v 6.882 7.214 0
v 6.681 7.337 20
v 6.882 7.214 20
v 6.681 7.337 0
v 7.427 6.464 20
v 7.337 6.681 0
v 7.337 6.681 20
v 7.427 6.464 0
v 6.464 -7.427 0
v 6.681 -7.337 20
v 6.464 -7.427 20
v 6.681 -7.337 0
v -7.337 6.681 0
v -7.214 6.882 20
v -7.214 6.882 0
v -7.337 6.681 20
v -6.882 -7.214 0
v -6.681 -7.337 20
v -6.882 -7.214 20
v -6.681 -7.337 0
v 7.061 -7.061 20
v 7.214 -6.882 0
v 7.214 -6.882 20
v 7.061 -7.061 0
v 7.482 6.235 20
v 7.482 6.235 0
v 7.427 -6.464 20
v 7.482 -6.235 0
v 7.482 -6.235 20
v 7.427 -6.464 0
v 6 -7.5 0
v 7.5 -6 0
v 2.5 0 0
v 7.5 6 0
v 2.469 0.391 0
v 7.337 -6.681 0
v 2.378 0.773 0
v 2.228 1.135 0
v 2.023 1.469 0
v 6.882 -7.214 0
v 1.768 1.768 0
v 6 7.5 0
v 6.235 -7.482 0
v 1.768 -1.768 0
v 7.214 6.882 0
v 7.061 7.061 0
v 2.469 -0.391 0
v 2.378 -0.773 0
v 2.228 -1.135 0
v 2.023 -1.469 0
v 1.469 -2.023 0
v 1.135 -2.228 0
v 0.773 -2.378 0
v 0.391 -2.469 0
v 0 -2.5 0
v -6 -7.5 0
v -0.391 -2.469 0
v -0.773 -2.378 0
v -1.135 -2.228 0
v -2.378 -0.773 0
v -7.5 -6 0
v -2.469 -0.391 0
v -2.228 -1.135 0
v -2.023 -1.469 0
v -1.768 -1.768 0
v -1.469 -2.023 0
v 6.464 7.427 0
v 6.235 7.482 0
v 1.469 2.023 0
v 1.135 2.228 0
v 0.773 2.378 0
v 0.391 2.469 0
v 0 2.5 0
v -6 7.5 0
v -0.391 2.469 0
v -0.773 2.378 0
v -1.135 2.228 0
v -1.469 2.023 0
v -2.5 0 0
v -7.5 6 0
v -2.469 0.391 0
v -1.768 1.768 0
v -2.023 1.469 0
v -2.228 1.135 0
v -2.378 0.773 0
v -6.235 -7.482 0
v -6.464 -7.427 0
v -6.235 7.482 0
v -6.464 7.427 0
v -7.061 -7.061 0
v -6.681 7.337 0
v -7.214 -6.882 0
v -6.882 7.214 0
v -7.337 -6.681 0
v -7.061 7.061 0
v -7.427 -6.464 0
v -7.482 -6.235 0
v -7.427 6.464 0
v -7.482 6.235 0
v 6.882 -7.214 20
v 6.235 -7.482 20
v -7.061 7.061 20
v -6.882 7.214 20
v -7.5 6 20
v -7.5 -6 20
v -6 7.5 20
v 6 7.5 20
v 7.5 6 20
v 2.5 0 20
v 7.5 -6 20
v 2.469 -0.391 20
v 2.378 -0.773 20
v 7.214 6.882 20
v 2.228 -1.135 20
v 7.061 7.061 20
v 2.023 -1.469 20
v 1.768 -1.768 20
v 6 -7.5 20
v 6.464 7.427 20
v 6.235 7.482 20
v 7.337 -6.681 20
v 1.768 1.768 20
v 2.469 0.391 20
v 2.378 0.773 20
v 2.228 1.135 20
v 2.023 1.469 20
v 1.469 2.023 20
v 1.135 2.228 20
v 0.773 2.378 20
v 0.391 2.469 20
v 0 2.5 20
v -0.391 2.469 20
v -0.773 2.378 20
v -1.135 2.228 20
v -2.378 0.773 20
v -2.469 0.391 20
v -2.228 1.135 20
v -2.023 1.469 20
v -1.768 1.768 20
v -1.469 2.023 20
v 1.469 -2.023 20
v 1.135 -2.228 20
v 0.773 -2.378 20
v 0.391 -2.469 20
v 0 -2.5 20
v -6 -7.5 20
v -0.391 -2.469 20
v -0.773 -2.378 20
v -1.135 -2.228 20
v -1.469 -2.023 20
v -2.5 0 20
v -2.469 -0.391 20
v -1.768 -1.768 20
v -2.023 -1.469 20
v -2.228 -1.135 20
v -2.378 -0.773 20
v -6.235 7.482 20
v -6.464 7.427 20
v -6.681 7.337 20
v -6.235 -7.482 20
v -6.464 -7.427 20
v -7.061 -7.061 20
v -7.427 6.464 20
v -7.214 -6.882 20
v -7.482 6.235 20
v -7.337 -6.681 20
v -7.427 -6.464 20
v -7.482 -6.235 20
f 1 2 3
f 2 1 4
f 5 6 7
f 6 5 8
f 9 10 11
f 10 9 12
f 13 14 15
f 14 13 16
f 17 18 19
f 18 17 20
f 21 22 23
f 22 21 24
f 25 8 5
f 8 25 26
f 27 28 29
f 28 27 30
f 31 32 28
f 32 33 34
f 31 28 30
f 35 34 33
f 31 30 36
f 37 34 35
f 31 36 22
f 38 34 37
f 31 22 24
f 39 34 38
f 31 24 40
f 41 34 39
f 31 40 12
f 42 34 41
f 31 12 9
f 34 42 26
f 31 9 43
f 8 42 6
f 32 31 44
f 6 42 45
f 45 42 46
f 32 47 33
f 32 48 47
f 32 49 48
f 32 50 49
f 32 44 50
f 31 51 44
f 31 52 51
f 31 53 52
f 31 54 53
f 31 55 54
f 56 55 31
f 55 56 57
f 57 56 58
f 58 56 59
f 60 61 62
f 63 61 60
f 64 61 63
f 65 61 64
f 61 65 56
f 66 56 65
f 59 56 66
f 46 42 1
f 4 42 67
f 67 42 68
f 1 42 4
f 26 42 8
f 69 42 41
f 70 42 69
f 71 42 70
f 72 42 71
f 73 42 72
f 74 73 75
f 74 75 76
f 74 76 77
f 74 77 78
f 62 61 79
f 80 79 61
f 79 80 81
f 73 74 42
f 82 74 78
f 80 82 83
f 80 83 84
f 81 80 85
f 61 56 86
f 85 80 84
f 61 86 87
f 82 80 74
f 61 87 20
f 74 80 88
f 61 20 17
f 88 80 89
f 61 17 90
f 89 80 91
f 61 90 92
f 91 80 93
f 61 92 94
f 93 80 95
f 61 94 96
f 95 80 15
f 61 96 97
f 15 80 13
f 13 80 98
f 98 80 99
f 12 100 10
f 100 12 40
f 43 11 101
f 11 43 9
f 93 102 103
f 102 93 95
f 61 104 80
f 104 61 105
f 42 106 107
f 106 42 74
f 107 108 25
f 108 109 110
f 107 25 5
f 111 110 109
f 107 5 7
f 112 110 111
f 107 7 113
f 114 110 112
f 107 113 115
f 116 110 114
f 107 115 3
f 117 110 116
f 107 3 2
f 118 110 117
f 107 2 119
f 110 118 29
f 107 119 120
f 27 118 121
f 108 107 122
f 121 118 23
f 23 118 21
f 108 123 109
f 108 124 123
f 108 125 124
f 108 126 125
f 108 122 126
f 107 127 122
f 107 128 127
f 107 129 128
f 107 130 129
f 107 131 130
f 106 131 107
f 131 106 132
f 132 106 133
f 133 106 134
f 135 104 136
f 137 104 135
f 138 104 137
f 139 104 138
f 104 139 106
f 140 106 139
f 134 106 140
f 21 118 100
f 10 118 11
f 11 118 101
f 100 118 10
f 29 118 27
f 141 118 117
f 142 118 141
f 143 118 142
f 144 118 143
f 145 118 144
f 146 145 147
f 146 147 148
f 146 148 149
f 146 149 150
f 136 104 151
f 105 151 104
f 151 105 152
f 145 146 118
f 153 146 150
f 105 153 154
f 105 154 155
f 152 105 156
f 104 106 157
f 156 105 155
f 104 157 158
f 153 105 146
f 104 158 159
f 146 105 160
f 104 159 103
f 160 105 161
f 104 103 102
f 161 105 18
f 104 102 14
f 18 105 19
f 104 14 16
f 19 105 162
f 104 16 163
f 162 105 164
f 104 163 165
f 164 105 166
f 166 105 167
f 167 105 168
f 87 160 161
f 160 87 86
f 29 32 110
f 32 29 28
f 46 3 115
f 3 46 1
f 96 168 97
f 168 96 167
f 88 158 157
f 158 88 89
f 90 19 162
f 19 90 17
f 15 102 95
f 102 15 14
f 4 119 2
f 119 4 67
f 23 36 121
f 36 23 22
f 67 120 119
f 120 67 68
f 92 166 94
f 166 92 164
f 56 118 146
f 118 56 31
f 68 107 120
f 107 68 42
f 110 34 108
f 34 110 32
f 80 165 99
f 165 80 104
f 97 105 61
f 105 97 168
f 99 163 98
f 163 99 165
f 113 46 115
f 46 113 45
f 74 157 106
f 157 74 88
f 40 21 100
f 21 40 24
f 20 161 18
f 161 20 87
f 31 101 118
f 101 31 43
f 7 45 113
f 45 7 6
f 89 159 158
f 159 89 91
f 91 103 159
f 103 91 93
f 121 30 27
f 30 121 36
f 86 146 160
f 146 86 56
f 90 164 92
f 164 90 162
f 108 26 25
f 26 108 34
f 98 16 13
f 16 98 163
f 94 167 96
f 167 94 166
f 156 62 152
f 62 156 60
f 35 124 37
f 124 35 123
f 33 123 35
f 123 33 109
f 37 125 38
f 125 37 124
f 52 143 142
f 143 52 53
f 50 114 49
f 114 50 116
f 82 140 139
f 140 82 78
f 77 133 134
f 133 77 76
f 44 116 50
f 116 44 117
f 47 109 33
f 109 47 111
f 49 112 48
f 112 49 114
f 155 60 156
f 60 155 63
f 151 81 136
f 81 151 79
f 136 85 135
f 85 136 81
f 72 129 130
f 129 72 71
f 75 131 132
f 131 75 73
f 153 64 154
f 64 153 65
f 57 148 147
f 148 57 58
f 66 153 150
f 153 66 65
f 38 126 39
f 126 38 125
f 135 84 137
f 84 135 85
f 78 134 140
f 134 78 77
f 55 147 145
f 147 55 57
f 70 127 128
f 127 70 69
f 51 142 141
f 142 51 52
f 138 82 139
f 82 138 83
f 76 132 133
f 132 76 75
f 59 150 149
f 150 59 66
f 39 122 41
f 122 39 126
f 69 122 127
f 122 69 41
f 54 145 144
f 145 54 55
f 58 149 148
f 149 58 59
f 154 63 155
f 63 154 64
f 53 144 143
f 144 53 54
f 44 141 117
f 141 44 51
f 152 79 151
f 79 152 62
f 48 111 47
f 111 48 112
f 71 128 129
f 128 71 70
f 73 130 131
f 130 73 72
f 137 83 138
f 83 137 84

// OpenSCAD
$fn=40;

difference() {
   hull() {
      translate([-6,-6,0]) cylinder(r=1.5,h=20);
      translate([-6,6,0]) cylinder(r=1.5,h=20);
      translate([6,-6,0]) cylinder(r=1.5,h=20);
      translate([6,6,0]) cylinder(r=1.5,h=20);
   }
   translate([0,0,-1]) cylinder(d=5,h=22);
}
